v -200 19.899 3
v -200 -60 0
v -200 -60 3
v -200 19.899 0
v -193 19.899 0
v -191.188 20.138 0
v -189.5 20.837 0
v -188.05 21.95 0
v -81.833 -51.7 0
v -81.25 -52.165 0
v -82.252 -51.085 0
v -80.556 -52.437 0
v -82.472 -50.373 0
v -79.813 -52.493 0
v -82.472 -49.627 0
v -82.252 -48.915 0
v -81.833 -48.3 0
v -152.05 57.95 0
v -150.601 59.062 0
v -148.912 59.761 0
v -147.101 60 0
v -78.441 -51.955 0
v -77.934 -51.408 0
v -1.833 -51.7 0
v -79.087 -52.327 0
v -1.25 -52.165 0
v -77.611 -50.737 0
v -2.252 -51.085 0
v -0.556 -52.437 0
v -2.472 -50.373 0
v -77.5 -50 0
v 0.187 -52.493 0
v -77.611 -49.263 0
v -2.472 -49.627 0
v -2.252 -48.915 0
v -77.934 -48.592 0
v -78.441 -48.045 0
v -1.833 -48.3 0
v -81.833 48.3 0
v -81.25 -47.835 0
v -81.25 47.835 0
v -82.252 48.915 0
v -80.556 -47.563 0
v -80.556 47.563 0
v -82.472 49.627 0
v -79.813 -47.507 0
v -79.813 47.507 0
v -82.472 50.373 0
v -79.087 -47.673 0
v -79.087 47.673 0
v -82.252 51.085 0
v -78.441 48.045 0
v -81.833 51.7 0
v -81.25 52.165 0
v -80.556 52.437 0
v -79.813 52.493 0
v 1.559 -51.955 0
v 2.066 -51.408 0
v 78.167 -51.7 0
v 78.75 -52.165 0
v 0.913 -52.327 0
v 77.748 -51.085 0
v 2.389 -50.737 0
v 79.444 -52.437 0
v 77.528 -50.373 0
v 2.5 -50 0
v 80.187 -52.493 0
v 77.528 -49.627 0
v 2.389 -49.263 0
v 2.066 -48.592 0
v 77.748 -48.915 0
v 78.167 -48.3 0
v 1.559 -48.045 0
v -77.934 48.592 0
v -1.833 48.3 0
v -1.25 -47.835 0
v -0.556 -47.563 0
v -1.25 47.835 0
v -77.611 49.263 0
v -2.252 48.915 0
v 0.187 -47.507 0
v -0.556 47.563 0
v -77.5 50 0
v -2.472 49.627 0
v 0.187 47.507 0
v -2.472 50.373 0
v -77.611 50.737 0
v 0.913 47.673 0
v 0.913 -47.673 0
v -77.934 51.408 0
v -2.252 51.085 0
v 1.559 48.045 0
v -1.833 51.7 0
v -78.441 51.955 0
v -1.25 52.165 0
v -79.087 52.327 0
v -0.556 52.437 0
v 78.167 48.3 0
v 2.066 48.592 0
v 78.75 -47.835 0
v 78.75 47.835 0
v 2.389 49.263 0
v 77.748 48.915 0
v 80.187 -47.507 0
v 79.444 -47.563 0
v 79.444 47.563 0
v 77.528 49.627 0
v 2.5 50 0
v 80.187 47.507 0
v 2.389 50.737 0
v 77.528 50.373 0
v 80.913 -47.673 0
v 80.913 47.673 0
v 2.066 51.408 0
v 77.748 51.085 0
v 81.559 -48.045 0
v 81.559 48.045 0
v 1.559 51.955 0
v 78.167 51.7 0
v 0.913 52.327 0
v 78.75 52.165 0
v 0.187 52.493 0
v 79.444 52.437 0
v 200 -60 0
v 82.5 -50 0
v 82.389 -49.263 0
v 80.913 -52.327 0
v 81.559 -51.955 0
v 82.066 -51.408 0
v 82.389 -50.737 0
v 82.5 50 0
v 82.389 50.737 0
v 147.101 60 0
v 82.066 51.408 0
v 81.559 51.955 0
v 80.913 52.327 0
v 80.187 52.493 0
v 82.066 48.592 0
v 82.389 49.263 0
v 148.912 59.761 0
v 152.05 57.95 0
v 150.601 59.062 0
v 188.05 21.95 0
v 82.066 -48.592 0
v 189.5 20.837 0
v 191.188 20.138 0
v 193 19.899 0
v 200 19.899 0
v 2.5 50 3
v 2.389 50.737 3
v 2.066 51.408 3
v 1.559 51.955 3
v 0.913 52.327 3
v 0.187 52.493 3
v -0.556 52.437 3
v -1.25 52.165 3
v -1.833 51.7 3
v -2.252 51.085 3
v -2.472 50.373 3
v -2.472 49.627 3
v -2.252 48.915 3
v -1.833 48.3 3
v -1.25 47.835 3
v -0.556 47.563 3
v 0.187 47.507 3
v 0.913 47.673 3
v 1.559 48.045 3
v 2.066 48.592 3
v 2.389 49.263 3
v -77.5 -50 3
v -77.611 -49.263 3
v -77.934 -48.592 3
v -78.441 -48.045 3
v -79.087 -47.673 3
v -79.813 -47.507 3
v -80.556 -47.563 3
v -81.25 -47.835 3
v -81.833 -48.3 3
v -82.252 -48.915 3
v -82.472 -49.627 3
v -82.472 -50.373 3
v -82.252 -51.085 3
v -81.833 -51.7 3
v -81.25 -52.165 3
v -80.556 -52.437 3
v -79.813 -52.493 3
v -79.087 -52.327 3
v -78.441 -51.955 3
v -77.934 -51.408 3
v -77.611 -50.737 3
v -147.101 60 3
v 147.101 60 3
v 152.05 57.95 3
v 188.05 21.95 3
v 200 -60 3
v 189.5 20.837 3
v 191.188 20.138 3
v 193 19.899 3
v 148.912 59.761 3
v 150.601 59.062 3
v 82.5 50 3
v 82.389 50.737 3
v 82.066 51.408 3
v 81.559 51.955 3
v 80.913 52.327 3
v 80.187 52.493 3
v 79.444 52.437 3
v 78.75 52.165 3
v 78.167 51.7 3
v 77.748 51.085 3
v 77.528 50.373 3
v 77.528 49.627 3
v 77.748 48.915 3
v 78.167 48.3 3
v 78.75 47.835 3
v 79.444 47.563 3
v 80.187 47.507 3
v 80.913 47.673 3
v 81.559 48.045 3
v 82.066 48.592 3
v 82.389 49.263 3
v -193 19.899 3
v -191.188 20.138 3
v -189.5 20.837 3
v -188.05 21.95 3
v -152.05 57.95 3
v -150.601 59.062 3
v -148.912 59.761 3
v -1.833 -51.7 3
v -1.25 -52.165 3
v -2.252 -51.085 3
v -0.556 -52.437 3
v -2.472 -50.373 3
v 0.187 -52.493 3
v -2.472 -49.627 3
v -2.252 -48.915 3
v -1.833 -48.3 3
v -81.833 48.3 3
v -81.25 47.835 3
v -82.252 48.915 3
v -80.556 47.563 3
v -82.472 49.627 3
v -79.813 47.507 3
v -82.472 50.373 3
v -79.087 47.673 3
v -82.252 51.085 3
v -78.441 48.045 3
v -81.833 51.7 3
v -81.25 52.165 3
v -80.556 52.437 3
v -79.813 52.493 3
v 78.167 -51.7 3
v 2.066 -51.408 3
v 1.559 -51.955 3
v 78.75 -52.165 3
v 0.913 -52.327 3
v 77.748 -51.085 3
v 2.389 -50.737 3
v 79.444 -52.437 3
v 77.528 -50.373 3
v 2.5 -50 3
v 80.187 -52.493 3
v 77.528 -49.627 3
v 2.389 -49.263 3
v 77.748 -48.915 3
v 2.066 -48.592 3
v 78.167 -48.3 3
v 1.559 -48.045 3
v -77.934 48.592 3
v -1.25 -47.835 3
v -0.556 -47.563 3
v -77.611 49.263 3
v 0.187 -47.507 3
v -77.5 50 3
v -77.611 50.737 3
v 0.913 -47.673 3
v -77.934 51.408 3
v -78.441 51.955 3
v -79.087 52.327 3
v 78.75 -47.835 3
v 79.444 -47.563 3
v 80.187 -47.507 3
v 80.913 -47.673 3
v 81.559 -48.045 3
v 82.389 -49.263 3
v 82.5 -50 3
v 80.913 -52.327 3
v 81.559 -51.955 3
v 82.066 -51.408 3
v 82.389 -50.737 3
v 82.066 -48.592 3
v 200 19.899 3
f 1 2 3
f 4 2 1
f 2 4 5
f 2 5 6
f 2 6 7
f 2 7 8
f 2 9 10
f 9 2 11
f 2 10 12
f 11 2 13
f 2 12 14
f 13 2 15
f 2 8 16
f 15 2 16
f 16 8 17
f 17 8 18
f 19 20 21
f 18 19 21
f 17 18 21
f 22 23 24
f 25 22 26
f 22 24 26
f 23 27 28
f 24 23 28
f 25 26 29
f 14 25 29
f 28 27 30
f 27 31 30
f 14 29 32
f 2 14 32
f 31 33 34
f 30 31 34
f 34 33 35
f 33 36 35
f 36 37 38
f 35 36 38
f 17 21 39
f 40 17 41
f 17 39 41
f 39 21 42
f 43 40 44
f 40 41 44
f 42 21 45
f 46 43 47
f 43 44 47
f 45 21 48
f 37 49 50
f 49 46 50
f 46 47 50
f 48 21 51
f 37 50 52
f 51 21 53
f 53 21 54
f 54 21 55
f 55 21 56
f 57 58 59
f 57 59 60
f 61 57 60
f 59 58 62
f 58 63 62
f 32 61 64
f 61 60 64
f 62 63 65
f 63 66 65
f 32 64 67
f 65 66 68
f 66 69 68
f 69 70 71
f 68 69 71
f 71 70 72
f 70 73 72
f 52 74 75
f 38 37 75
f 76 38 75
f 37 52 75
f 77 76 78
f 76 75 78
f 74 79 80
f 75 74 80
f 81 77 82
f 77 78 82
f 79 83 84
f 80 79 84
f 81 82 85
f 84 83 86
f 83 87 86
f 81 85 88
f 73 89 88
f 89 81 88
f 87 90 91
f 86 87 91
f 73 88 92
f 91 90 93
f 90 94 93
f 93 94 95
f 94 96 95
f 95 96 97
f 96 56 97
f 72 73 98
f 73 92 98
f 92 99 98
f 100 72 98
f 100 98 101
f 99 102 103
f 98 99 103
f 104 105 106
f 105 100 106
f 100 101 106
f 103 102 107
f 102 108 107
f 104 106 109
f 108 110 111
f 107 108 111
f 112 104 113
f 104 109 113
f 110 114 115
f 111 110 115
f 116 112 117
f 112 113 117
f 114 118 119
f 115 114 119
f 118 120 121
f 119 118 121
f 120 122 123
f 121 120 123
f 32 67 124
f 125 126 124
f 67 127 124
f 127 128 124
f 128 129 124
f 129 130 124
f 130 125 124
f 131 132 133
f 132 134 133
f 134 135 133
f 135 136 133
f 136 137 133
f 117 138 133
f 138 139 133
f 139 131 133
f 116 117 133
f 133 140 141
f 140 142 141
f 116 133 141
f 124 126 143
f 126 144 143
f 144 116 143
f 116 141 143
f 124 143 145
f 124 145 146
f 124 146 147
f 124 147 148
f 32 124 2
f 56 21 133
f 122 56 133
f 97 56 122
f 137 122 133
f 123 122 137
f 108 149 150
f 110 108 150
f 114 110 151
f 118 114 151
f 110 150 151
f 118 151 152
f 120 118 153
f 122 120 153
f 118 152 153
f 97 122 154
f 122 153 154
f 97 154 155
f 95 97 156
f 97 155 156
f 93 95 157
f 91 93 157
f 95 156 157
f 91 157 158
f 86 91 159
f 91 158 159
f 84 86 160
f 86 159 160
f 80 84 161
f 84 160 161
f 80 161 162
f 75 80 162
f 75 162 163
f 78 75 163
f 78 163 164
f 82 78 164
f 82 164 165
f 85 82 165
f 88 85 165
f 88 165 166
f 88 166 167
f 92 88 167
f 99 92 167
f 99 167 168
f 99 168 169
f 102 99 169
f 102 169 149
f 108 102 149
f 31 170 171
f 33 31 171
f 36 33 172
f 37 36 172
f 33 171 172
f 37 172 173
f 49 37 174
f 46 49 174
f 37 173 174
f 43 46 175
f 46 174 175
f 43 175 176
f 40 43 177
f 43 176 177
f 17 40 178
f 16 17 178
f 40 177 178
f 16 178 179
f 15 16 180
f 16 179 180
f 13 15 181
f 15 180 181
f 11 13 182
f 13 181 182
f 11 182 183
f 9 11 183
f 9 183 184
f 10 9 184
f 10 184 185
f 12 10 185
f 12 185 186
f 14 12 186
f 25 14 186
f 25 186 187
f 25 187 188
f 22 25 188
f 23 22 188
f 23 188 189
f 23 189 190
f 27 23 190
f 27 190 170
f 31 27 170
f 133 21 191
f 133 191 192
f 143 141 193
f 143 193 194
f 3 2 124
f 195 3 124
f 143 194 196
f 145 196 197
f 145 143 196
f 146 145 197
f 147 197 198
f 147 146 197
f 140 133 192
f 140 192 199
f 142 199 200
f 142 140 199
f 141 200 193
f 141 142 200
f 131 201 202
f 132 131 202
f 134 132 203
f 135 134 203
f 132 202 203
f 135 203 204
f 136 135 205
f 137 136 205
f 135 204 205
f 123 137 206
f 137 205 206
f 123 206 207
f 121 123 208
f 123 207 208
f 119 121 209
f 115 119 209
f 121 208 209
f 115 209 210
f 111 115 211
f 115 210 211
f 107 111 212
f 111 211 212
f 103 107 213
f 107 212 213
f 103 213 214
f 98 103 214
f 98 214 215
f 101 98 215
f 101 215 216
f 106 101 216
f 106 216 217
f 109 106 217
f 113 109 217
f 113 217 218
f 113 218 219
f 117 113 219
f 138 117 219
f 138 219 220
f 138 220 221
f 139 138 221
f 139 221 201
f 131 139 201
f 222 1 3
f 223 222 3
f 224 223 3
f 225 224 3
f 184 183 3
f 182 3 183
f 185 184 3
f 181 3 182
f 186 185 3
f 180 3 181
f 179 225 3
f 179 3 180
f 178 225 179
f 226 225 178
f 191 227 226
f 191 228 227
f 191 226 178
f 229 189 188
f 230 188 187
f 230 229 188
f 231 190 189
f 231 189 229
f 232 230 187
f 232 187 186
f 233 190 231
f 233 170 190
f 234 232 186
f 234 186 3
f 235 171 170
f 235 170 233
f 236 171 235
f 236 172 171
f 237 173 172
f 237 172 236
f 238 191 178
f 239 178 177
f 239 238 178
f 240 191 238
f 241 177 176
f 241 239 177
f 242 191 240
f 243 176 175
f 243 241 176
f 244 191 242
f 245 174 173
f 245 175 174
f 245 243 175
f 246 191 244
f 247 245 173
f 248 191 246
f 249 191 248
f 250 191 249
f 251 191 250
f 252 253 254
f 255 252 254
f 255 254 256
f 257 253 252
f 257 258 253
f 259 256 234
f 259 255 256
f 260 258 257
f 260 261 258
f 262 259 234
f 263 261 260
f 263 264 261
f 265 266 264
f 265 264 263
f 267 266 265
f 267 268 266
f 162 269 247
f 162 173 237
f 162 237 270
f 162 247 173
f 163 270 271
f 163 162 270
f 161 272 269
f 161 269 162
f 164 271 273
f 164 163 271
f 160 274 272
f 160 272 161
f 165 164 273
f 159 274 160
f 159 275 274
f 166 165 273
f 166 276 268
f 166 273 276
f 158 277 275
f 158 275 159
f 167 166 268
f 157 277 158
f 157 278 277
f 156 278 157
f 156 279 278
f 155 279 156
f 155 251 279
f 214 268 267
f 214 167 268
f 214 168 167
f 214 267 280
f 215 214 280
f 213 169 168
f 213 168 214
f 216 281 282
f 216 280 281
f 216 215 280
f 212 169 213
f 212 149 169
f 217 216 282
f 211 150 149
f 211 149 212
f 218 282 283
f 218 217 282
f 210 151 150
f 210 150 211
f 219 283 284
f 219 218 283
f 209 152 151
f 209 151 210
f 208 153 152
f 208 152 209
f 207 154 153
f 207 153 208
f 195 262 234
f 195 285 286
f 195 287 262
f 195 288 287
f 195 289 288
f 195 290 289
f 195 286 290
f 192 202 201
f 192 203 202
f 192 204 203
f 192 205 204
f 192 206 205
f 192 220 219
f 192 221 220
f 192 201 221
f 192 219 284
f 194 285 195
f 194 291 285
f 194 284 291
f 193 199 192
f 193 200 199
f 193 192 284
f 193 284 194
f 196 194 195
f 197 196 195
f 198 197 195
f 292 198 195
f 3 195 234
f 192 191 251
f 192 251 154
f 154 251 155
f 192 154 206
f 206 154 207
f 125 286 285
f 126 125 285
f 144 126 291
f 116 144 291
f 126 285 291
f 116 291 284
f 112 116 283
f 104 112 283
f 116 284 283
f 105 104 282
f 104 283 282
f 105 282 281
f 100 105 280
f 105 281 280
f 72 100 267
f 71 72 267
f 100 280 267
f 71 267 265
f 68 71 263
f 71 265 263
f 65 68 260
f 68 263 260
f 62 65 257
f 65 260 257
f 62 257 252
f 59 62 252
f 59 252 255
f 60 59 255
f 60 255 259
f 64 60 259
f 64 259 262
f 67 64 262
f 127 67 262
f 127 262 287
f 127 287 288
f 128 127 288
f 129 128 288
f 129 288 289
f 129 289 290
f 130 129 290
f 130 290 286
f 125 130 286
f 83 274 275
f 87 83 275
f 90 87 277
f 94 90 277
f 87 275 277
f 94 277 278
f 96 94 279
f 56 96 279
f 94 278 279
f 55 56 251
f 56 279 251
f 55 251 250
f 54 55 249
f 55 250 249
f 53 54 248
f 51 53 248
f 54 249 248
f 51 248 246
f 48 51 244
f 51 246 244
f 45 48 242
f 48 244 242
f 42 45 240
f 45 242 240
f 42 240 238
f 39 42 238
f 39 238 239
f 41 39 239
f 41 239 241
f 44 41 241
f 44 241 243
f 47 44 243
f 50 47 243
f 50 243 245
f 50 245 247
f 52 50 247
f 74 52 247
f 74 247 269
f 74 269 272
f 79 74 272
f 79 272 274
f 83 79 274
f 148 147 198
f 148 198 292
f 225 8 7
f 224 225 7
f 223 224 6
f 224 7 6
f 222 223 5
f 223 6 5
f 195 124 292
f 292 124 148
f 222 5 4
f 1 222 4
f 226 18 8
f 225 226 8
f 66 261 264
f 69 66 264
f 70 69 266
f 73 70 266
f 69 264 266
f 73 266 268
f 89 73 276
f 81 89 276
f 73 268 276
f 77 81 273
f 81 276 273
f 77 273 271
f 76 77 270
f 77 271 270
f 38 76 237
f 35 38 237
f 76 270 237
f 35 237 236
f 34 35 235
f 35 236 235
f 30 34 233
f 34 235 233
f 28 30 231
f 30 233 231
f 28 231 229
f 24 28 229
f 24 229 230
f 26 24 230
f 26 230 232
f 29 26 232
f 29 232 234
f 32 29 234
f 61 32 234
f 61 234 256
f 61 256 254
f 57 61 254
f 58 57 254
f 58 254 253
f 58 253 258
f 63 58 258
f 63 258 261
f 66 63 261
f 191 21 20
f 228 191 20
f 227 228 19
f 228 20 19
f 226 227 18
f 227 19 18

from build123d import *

# Parameters (mm, degrees)
SKETCH1_W           = 400
SKETCH1_H           = 120
BOSS_EXTRUDE1_DEPTH = 3
CUT_EXTRUDE1_REACH  = 210.828
CUT_EXTRUDE2_REACH  = 210.828
SKETCH3_R           = 2.5


with BuildPart() as part:
    # Sketch1 → Boss-Extrude1 (new body)
    with BuildSketch(Plane.XY):
        Rectangle(SKETCH1_W, SKETCH1_H)
    extrude(amount=BOSS_EXTRUDE1_DEPTH)

    # Sketch2 → Cut-Extrude1 (cut, up to next)
    with BuildSketch(Plane(origin=(0, 0, 0), x_dir=(-1, 0, 0), z_dir=(0, 0, -1)), mode=Mode.PRIVATE) as cut_extrude1_sk1:
        with BuildLine():
            Line((200, 60), (147.100505063, 60))
            ThreePointArc((147.100505063, 60), (149.77928909, 59.467156728), (152.050252532, 57.949747468))
            Line((152.050252532, 57.949747468), (188.050252532, 21.949747468))
            ThreePointArc((188.050252532, 21.949747468), (190.321215973, 20.432338209), (193, 19.899494937))
            Line((193, 19.899494937), (200, 19.899494937))
            Line((200, 19.899494937), (200, 60))
        make_face()
    cut_extrude1_tool1 = extrude(cut_extrude1_sk1.sketch, amount=-CUT_EXTRUDE1_REACH, mode=Mode.PRIVATE) & part.part
    # Sketch2 → Cut-Extrude1 (cut, up to next)
    with BuildSketch(Plane(origin=(0, 0, 0), x_dir=(-1, 0, 0), z_dir=(0, 0, -1)), mode=Mode.PRIVATE) as cut_extrude1_sk2:
        with BuildLine():
            Line((-152.050252532, 57.949747468), (-188.050252532, 21.949747468))
            ThreePointArc((-188.050252532, 21.949747468), (-190.321215973, 20.432338209), (-193, 19.899494937))
            Line((-193, 19.899494937), (-200, 19.899494937))
            Line((-200, 19.899494937), (-200, 60))
            Line((-200, 60), (-147.100505063, 60))
            ThreePointArc((-147.100505063, 60), (-149.77928909, 59.467156728), (-152.050252532, 57.949747468))
        make_face()
    cut_extrude1_tool2 = extrude(cut_extrude1_sk2.sketch, amount=-CUT_EXTRUDE1_REACH, mode=Mode.PRIVATE) & part.part
    add(cut_extrude1_tool1.solids().sort_by_distance((-182.75247, 44.458509, 0))[0], mode=Mode.SUBTRACT)
    add(cut_extrude1_tool2.solids().sort_by_distance((182.75247, 44.458509, 0))[0], mode=Mode.SUBTRACT)

    # Sketch3 → Cut-Extrude2 (cut, up to next)
    with BuildSketch(Plane.XY.offset(3), mode=Mode.PRIVATE) as cut_extrude2_sk1:
        with Locations((-80, 50)):
            Circle(SKETCH3_R)
    cut_extrude2_tool1 = extrude(cut_extrude2_sk1.sketch, amount=-CUT_EXTRUDE2_REACH, mode=Mode.PRIVATE) & part.part
    # Sketch3 → Cut-Extrude2 (cut, up to next)
    with BuildSketch(Plane.XY.offset(3), mode=Mode.PRIVATE) as cut_extrude2_sk2:
        with Locations((0, 50)):
            Circle(SKETCH3_R)
    cut_extrude2_tool2 = extrude(cut_extrude2_sk2.sketch, amount=-CUT_EXTRUDE2_REACH, mode=Mode.PRIVATE) & part.part
    # Sketch3 → Cut-Extrude2 (cut, up to next)
    with BuildSketch(Plane.XY.offset(3), mode=Mode.PRIVATE) as cut_extrude2_sk3:
        with Locations((0, -50)):
            Circle(SKETCH3_R)
    cut_extrude2_tool3 = extrude(cut_extrude2_sk3.sketch, amount=-CUT_EXTRUDE2_REACH, mode=Mode.PRIVATE) & part.part
    # Sketch3 → Cut-Extrude2 (cut, up to next)
    with BuildSketch(Plane.XY.offset(3), mode=Mode.PRIVATE) as cut_extrude2_sk4:
        with Locations((-80, -50)):
            Circle(SKETCH3_R)
    cut_extrude2_tool4 = extrude(cut_extrude2_sk4.sketch, amount=-CUT_EXTRUDE2_REACH, mode=Mode.PRIVATE) & part.part
    # Sketch3 → Cut-Extrude2 (cut, up to next)
    with BuildSketch(Plane.XY.offset(3), mode=Mode.PRIVATE) as cut_extrude2_sk5:
        with Locations((80, -50)):
            Circle(SKETCH3_R)
    cut_extrude2_tool5 = extrude(cut_extrude2_sk5.sketch, amount=-CUT_EXTRUDE2_REACH, mode=Mode.PRIVATE) & part.part
    # Sketch3 → Cut-Extrude2 (cut, up to next)
    with BuildSketch(Plane.XY.offset(3), mode=Mode.PRIVATE) as cut_extrude2_sk6:
        with Locations((80, 50)):
            Circle(SKETCH3_R)
    cut_extrude2_tool6 = extrude(cut_extrude2_sk6.sketch, amount=-CUT_EXTRUDE2_REACH, mode=Mode.PRIVATE) & part.part
    add(cut_extrude2_tool1.solids().sort_by_distance((-80, 50, 3))[0], mode=Mode.SUBTRACT)
    add(cut_extrude2_tool2.solids().sort_by_distance((0, 50, 3))[0], mode=Mode.SUBTRACT)
    add(cut_extrude2_tool3.solids().sort_by_distance((0, -50, 3))[0], mode=Mode.SUBTRACT)
    add(cut_extrude2_tool4.solids().sort_by_distance((-80, -50, 3))[0], mode=Mode.SUBTRACT)
    add(cut_extrude2_tool5.solids().sort_by_distance((80, -50, 3))[0], mode=Mode.SUBTRACT)
    add(cut_extrude2_tool6.solids().sort_by_distance((80, 50, 3))[0], mode=Mode.SUBTRACT)


solid = part.part
